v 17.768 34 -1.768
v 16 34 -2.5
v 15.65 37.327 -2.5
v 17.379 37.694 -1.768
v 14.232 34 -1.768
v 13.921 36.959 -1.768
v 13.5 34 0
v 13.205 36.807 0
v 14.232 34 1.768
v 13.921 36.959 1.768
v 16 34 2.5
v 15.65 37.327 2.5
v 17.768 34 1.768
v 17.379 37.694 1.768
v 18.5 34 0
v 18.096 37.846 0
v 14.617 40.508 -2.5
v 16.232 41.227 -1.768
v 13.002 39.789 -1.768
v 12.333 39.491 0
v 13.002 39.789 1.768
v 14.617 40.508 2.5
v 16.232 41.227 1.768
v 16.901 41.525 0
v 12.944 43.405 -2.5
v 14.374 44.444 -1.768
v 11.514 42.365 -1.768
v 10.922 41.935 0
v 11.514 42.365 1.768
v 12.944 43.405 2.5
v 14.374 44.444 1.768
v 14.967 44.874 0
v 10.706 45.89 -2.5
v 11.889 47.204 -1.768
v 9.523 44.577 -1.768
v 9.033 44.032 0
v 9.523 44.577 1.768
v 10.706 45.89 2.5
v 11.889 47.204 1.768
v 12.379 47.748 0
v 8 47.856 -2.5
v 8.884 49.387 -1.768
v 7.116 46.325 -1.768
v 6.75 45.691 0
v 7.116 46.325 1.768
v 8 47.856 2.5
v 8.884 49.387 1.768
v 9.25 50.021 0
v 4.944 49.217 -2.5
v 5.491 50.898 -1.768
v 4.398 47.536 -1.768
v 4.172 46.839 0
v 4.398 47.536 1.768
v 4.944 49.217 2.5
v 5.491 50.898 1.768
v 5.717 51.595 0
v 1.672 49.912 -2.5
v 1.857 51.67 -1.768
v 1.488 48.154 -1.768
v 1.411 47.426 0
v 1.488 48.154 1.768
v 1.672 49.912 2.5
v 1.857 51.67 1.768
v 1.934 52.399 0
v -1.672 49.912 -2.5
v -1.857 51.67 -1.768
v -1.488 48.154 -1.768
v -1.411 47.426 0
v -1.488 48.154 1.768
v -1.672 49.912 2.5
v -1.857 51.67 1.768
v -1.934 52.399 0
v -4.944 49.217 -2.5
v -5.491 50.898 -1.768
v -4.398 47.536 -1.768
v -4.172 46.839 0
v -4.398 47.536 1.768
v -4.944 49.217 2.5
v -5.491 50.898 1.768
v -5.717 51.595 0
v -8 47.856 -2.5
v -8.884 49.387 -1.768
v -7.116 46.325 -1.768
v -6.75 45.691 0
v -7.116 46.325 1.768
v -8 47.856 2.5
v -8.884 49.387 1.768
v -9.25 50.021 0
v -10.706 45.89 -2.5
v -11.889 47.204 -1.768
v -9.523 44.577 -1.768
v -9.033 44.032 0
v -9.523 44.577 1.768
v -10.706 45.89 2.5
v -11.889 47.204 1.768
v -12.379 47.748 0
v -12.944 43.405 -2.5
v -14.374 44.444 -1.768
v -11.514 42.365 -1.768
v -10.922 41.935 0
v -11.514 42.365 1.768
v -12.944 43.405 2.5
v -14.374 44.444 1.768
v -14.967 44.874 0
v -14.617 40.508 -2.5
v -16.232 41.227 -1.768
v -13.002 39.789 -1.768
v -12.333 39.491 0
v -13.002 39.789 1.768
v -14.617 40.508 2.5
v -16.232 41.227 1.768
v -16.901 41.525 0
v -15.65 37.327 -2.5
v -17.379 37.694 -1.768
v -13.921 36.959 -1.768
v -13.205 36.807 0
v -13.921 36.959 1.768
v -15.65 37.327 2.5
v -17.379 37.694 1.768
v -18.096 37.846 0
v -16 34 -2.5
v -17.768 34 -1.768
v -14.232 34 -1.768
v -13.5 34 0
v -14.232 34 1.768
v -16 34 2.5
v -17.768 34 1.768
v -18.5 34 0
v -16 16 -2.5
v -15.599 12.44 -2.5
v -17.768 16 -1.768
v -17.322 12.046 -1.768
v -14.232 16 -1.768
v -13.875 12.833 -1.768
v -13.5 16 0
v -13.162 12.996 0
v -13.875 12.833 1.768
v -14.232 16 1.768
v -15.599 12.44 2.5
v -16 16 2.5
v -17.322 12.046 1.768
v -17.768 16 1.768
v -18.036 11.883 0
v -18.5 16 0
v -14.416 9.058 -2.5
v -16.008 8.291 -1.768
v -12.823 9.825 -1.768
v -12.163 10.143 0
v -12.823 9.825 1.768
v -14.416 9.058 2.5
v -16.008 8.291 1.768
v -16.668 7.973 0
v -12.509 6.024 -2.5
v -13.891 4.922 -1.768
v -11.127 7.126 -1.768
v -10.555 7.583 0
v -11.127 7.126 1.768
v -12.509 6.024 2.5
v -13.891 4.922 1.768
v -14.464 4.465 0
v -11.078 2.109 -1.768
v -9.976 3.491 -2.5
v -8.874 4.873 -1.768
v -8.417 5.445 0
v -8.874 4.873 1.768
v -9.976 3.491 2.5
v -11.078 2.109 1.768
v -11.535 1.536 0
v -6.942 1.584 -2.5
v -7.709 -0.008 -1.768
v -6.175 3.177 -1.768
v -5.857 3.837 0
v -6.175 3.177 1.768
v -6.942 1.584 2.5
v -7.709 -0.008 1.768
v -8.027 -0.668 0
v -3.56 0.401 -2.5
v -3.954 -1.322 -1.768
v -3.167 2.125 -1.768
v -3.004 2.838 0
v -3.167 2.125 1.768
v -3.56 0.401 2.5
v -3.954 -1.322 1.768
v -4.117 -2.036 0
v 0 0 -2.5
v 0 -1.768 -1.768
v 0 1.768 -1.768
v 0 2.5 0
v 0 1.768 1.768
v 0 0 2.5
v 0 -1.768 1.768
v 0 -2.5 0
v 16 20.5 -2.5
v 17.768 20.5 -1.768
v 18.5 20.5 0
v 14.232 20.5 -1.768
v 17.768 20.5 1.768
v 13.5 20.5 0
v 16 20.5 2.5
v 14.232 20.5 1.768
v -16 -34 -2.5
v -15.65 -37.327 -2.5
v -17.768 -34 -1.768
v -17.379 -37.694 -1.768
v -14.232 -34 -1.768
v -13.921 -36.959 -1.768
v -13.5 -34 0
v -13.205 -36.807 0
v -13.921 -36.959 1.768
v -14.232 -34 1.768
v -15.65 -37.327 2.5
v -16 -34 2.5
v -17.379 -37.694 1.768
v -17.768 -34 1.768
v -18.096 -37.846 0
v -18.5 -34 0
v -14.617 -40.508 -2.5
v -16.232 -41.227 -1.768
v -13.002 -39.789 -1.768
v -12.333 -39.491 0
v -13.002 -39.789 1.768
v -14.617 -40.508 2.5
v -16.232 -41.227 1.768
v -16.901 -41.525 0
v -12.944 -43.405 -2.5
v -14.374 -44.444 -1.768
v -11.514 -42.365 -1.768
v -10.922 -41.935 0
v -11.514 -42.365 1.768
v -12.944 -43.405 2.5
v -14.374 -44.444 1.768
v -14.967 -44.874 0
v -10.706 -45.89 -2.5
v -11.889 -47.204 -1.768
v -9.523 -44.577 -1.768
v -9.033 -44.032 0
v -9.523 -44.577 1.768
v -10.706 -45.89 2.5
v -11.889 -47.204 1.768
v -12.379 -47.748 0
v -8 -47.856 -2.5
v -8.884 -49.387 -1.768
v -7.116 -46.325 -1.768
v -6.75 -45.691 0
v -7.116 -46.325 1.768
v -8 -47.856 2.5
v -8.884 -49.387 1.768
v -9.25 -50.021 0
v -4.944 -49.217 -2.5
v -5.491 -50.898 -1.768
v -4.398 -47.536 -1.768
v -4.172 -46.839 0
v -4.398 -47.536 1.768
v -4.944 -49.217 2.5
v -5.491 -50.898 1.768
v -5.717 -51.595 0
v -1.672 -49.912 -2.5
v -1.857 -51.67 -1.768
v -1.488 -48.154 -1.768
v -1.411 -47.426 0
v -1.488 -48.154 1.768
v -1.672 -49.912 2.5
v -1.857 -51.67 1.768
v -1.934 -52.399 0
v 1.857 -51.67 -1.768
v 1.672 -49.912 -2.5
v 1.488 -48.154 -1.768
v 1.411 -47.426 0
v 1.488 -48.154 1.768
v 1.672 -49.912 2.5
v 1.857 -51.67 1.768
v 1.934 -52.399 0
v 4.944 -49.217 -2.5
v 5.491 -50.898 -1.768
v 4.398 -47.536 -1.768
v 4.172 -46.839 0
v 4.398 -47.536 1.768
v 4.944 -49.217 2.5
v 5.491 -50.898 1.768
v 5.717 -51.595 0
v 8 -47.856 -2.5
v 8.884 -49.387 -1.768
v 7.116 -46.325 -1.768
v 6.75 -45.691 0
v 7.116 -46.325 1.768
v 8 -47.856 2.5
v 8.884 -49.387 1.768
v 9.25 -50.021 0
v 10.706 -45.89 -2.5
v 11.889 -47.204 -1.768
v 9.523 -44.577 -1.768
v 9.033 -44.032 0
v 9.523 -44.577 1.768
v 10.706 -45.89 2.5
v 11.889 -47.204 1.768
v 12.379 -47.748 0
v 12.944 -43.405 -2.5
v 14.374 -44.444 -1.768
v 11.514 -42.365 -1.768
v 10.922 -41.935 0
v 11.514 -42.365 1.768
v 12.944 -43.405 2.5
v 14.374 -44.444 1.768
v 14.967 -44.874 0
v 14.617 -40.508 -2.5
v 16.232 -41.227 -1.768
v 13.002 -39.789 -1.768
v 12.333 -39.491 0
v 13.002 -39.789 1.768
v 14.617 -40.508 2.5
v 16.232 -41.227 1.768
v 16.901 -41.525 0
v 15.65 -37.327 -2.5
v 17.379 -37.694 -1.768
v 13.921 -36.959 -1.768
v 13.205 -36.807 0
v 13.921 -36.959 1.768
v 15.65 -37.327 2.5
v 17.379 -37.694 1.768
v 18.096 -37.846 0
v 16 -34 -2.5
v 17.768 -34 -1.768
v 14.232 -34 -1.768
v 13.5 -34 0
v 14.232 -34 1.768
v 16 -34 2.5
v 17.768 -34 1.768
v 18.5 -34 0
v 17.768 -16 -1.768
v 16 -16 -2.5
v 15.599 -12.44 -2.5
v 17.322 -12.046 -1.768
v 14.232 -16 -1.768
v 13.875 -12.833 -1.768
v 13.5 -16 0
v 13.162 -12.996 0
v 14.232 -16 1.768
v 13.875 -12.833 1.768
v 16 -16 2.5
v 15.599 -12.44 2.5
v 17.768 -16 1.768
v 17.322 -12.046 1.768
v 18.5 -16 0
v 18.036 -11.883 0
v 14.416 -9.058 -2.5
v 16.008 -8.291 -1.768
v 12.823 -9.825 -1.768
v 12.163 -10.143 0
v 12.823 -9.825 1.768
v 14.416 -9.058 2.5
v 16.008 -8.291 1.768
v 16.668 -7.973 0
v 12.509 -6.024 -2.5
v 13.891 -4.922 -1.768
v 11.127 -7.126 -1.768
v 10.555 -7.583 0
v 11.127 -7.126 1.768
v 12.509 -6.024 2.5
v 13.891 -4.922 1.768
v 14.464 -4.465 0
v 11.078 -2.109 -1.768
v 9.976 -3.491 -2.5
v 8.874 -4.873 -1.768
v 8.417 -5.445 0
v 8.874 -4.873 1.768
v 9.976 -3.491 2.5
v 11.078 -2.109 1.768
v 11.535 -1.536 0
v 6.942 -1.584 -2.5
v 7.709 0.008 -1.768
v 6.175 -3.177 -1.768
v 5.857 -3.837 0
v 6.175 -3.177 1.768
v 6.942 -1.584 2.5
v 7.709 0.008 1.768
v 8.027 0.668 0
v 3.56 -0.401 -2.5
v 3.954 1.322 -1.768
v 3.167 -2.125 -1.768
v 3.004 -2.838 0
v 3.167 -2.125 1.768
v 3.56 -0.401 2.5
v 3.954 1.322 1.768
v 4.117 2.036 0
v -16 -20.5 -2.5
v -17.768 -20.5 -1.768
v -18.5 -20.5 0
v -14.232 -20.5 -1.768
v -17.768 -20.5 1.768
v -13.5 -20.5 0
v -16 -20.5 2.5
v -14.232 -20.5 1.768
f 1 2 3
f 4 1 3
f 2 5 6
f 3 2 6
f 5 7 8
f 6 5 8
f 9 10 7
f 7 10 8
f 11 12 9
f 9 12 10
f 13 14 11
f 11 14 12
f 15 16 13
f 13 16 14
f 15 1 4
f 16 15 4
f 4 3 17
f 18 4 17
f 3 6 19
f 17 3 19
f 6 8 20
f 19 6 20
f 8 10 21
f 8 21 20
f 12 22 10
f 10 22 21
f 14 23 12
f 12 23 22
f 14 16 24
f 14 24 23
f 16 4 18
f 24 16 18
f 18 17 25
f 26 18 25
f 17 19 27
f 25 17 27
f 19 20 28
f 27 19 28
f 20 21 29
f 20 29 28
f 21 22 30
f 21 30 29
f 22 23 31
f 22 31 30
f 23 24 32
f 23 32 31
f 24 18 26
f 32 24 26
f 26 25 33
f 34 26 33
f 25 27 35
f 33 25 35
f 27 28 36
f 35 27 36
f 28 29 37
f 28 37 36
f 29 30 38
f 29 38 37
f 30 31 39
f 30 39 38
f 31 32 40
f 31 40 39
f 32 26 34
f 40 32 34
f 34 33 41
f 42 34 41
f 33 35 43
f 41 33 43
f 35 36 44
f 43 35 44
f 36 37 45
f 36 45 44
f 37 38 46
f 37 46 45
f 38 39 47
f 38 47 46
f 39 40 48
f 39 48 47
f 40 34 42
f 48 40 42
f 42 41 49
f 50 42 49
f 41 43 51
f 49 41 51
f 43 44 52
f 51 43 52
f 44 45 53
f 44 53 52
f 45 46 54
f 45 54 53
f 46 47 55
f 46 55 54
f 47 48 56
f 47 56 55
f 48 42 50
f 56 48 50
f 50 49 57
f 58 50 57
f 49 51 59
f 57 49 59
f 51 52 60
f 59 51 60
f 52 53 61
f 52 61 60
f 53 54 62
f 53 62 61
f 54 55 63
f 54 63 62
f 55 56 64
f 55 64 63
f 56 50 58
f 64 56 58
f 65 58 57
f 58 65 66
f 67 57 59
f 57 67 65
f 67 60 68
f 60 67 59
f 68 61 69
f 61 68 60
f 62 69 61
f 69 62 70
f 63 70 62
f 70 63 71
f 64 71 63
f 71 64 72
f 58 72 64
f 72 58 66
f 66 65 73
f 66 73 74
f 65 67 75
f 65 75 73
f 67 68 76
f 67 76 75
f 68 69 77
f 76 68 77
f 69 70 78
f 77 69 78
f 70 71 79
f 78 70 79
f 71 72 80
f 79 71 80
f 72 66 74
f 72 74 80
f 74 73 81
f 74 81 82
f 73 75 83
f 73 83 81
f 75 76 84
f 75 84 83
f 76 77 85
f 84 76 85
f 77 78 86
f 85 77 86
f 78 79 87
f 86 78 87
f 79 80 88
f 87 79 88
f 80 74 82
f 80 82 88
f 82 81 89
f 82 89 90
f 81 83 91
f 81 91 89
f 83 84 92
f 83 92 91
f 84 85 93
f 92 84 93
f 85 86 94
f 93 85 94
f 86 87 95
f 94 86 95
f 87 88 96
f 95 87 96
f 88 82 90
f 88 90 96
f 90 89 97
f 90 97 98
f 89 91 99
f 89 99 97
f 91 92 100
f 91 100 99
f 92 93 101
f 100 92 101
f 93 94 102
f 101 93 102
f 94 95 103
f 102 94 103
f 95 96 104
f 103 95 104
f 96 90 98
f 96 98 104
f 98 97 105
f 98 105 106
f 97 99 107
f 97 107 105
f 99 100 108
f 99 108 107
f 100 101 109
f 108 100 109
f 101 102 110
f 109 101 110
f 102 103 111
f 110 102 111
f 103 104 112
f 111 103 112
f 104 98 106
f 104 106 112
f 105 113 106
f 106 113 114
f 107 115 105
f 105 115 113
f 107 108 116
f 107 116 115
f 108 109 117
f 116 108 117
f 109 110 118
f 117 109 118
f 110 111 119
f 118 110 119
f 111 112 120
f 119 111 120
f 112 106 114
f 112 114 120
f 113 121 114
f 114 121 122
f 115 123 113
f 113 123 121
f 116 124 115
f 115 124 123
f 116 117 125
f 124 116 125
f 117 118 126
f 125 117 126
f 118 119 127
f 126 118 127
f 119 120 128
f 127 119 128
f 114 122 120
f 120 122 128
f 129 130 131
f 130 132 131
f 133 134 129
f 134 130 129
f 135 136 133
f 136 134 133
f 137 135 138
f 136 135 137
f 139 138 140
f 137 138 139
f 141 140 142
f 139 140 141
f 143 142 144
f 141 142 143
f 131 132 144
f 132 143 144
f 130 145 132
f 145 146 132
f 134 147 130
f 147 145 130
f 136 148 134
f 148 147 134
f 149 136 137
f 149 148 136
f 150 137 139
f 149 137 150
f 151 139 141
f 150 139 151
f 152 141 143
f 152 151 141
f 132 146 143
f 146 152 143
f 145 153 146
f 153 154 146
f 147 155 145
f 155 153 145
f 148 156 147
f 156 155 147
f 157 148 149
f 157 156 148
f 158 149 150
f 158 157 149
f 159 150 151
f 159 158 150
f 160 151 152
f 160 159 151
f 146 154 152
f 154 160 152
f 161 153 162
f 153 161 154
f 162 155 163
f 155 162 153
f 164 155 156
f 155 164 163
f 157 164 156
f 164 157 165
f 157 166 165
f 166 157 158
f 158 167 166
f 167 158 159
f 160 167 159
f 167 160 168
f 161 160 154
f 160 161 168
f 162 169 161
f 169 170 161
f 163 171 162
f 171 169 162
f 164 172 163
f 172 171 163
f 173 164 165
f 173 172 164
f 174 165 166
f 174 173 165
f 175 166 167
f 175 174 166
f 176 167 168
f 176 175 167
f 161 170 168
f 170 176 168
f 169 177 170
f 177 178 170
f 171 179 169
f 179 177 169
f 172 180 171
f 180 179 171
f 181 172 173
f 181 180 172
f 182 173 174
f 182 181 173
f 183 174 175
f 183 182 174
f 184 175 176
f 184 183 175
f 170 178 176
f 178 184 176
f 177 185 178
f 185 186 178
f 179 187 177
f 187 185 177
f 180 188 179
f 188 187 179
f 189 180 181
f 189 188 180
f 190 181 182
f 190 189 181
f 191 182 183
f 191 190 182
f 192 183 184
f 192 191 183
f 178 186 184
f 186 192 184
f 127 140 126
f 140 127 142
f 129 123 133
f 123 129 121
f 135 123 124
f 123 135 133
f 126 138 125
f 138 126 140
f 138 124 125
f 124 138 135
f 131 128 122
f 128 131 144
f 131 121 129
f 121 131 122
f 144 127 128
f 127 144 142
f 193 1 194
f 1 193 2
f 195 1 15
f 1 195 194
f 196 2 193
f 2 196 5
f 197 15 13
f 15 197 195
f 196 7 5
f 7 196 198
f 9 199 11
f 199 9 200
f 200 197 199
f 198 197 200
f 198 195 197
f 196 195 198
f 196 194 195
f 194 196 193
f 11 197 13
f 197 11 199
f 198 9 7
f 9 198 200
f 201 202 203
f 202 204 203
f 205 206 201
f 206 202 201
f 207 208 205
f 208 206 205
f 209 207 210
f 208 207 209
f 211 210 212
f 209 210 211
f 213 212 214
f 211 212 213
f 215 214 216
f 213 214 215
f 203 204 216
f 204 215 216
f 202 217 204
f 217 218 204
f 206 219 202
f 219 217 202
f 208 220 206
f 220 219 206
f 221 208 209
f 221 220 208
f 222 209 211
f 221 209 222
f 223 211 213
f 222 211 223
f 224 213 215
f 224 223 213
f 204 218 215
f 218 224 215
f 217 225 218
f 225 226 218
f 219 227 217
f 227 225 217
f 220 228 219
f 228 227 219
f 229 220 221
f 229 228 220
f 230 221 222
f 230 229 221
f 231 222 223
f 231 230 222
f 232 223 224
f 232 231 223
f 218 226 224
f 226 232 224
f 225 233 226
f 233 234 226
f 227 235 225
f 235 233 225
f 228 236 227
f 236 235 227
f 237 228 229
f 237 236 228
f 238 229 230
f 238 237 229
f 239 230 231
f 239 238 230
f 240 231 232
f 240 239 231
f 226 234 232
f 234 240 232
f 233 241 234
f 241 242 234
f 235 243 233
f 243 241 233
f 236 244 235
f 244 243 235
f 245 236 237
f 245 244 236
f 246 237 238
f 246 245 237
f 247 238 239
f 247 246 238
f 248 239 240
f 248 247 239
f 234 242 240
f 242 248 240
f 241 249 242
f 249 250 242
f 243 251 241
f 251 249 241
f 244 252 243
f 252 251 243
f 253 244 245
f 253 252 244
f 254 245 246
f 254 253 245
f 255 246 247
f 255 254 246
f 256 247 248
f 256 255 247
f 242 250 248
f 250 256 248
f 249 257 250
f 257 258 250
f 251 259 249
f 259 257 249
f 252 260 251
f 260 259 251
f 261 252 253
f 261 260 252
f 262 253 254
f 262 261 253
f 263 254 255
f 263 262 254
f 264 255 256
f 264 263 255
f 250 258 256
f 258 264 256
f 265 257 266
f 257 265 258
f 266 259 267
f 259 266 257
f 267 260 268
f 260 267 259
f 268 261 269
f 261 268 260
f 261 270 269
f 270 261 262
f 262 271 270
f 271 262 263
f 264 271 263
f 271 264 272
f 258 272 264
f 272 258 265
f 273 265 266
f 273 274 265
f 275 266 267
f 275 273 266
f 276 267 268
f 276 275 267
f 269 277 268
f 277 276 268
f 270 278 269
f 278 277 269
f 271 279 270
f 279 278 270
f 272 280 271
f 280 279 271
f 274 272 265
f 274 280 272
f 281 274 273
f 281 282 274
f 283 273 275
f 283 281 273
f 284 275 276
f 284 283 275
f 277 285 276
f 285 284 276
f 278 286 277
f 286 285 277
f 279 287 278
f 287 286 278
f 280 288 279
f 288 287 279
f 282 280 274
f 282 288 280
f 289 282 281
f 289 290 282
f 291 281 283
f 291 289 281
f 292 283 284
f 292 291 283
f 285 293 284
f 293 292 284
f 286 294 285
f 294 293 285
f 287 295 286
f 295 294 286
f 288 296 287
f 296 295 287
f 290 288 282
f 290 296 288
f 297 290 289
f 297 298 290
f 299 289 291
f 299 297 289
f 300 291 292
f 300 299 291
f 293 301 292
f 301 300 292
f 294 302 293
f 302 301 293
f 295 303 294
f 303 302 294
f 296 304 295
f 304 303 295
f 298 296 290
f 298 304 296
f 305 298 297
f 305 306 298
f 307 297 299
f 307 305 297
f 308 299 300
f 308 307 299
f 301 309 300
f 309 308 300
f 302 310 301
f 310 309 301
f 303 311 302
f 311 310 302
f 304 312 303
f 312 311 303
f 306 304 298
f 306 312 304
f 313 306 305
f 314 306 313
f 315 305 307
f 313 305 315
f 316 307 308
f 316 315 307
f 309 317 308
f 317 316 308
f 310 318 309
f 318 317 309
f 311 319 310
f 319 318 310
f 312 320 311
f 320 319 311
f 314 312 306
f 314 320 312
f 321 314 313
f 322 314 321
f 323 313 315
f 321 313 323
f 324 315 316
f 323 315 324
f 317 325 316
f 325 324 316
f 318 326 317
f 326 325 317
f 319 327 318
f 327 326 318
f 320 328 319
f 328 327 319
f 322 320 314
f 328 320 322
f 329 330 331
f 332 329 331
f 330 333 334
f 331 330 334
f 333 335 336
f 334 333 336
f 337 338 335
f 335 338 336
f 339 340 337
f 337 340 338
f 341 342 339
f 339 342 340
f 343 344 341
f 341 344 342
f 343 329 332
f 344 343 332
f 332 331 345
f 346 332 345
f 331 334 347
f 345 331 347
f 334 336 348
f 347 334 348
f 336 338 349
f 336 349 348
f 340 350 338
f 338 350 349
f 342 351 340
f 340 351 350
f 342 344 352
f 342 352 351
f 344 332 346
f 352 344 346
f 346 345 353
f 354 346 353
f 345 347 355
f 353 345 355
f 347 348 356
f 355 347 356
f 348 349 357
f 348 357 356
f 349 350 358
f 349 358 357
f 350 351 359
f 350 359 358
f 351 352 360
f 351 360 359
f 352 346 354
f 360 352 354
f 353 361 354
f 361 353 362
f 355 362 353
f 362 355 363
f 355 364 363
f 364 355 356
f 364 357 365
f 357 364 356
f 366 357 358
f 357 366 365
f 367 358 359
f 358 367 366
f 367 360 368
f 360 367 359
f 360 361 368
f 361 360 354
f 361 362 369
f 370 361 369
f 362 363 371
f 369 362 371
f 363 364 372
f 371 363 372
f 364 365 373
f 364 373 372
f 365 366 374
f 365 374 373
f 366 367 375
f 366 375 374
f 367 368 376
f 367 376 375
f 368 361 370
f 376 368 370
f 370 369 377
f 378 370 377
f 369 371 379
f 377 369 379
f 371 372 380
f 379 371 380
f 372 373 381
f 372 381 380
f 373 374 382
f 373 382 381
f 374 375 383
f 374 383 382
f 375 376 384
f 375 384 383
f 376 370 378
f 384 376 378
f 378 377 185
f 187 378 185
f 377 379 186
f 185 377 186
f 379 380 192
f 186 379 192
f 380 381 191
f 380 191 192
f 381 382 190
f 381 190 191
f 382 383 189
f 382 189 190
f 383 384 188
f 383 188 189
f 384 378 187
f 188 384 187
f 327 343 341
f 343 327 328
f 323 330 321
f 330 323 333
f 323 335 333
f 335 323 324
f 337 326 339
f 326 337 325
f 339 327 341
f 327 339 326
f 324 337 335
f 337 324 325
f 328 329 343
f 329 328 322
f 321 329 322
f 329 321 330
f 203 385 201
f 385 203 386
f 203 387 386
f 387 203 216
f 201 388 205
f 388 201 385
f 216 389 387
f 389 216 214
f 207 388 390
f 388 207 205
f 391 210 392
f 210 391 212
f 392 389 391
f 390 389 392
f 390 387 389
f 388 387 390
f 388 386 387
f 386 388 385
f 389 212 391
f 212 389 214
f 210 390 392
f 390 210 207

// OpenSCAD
// file: torus.scad
module torus(inner, outer, angle, $fn=$fn) {
    rotate_extrude(angle=angle, $fn=$fn) {
        translate([outer, 0]) {
            circle(inner, $fn=$fn);
        }
    }
}
// file: constants.scad
CROSS_LENGTH = 60;
CROSS_R = 2.5;

CROSS_INNER = 2.5;
CROSS_OUTER = 30;

THREAD_LENGTH = 15;
THREAD_R = 8;
THREAD_PITCH = 4;
THREAD_N_STARTS = 2;

ROD_R = 10;
ROD_LENGTH = 300;
ROD_SEGMENTS = 4;

INNER_R = 5;
// main file
include <./constants.scad>;

use <./torus.scad>;

module hanger(width, height, r = CROSS_R) {
    // No pun intended...
    hook_r = width / 2;
    inner_height = (height / 2) - (2 * hook_r);


    for(z = [0, 180]) {
        rotate([0, 0, z]) {

            translate([0, inner_height + hook_r, 0]) {
                torus(r, hook_r, angle = 180);
            }
            
            translate([0, hook_r, 0]) {
                rotate([0, 0, 180]) {
                    torus(r, hook_r, angle = 90);
                }
            }

            translate([-hook_r, hook_r, 0]) {
                rotate([-90, 0, 0]) {
                    cylinder(inner_height, r, r);
                }
            }


            translate([hook_r, hook_r + inner_height / 4, 0]) {
                rotate([-90, 0, 0]) {
                    cylinder(3 * inner_height / 4, r, r);
                }
            }


        }
    }



}

hanger(ROD_R * 3.2, 100);
